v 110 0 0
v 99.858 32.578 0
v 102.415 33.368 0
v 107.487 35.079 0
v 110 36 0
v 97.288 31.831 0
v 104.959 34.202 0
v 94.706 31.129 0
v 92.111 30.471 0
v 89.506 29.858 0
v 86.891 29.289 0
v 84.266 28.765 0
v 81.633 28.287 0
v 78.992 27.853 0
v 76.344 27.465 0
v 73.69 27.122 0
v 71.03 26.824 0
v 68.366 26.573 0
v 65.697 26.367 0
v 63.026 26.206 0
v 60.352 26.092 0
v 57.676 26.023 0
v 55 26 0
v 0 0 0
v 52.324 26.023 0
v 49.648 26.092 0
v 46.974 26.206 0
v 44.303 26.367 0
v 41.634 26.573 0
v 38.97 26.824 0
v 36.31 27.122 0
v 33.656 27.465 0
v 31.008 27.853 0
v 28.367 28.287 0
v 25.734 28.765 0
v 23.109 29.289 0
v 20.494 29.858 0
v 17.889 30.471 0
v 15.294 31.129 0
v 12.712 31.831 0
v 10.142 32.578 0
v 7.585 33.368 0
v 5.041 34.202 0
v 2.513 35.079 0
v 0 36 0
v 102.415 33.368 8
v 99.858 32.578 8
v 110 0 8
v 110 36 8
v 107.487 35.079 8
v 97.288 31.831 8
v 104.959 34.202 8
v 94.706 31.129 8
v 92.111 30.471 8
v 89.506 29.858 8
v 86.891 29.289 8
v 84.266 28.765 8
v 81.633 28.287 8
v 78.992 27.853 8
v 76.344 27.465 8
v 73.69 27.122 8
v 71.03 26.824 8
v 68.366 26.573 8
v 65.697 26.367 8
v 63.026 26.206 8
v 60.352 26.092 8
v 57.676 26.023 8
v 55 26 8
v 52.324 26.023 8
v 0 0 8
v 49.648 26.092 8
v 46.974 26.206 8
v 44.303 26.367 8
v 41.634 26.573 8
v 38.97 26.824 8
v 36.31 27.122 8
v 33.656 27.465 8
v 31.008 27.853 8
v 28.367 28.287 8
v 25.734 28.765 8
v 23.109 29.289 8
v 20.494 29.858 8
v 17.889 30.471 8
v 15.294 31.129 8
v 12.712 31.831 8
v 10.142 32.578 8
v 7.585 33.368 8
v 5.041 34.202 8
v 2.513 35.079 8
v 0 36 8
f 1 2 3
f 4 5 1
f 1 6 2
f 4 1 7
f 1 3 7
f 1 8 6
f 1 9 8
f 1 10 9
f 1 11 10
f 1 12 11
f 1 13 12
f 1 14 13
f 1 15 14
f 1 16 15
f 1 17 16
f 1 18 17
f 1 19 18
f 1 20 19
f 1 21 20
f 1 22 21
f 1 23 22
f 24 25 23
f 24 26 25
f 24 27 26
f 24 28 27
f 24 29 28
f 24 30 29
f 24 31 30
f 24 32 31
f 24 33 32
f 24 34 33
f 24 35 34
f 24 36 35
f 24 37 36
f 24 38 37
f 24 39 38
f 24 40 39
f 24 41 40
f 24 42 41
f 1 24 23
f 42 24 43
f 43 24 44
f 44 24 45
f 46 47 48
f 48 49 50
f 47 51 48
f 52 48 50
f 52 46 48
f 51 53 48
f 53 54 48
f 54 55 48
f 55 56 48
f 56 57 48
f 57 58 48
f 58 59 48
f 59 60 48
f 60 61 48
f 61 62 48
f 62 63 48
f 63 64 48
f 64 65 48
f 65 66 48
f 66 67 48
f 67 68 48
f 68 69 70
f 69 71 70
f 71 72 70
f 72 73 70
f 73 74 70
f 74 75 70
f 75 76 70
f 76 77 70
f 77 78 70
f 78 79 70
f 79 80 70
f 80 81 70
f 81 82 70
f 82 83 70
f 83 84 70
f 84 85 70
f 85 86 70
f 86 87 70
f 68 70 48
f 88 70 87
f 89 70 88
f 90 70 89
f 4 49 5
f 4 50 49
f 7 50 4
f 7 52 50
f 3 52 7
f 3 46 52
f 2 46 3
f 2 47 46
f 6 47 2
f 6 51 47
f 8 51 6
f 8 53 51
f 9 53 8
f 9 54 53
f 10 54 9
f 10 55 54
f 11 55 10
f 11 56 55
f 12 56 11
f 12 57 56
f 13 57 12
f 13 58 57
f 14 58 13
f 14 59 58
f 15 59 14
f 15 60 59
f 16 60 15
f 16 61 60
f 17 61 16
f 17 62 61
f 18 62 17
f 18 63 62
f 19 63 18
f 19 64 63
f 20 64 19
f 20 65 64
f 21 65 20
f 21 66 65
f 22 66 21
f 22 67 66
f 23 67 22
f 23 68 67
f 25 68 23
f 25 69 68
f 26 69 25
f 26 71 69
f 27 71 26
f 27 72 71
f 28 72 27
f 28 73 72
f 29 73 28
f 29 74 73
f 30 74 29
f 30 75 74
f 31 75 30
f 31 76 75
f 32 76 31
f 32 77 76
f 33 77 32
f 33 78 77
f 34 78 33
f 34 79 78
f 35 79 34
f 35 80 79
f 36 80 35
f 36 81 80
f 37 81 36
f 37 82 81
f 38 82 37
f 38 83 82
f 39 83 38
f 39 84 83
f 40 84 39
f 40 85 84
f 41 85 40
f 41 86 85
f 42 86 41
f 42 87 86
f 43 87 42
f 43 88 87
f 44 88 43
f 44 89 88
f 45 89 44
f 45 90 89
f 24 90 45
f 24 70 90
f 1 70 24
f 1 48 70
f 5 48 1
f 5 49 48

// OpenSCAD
$fn = 32;

// ----------------------------------------------------------------------
// Arc profile plate: notch, 45 points
// ----------------------------------------------------------------------

// --- parameters (mm) ---
bar_l = 110;              // bar length, X
bar_w = 36;               // bar width, Y
notch_depth = 10;         // depth of the arc notch at mid-span
arc_r = 156.25;           // radius of the notch arc
arc_angle = 41.22;        // notch arc angle, degrees
arc_step = 1;             // sampling step of the notch arc, degrees
plate_t = 8;              // plate thickness, Z

profile = [[0, 0], [110, 0], [110, 36], [107.487, 35.079], [104.959, 34.202], [102.415, 33.368], [99.858, 32.578], [97.288, 31.831], [94.706, 31.129], [92.111, 30.471], [89.506, 29.858], [86.891, 29.289], [84.266, 28.765], [81.633, 28.287], [78.992, 27.853], [76.344, 27.465], [73.69, 27.122], [71.03, 26.824], [68.366, 26.573], [65.697, 26.367], [63.026, 26.206], [60.352, 26.092], [57.676, 26.023], [55, 26], [52.324, 26.023], [49.648, 26.092], [46.974, 26.206], [44.303, 26.367], [41.634, 26.573], [38.97, 26.824], [36.31, 27.122], [33.656, 27.465], [31.008, 27.853], [28.367, 28.287], [25.734, 28.765], [23.109, 29.289], [20.494, 29.858], [17.889, 30.471], [15.294, 31.129], [12.712, 31.831], [10.142, 32.578], [7.585, 33.368], [5.041, 34.202], [2.513, 35.079], [0, 36]];  // primary outline, 45 points, counter clockwise

// --- the one profile operation ---
linear_extrude(height = plate_t) polygon(points = profile);
